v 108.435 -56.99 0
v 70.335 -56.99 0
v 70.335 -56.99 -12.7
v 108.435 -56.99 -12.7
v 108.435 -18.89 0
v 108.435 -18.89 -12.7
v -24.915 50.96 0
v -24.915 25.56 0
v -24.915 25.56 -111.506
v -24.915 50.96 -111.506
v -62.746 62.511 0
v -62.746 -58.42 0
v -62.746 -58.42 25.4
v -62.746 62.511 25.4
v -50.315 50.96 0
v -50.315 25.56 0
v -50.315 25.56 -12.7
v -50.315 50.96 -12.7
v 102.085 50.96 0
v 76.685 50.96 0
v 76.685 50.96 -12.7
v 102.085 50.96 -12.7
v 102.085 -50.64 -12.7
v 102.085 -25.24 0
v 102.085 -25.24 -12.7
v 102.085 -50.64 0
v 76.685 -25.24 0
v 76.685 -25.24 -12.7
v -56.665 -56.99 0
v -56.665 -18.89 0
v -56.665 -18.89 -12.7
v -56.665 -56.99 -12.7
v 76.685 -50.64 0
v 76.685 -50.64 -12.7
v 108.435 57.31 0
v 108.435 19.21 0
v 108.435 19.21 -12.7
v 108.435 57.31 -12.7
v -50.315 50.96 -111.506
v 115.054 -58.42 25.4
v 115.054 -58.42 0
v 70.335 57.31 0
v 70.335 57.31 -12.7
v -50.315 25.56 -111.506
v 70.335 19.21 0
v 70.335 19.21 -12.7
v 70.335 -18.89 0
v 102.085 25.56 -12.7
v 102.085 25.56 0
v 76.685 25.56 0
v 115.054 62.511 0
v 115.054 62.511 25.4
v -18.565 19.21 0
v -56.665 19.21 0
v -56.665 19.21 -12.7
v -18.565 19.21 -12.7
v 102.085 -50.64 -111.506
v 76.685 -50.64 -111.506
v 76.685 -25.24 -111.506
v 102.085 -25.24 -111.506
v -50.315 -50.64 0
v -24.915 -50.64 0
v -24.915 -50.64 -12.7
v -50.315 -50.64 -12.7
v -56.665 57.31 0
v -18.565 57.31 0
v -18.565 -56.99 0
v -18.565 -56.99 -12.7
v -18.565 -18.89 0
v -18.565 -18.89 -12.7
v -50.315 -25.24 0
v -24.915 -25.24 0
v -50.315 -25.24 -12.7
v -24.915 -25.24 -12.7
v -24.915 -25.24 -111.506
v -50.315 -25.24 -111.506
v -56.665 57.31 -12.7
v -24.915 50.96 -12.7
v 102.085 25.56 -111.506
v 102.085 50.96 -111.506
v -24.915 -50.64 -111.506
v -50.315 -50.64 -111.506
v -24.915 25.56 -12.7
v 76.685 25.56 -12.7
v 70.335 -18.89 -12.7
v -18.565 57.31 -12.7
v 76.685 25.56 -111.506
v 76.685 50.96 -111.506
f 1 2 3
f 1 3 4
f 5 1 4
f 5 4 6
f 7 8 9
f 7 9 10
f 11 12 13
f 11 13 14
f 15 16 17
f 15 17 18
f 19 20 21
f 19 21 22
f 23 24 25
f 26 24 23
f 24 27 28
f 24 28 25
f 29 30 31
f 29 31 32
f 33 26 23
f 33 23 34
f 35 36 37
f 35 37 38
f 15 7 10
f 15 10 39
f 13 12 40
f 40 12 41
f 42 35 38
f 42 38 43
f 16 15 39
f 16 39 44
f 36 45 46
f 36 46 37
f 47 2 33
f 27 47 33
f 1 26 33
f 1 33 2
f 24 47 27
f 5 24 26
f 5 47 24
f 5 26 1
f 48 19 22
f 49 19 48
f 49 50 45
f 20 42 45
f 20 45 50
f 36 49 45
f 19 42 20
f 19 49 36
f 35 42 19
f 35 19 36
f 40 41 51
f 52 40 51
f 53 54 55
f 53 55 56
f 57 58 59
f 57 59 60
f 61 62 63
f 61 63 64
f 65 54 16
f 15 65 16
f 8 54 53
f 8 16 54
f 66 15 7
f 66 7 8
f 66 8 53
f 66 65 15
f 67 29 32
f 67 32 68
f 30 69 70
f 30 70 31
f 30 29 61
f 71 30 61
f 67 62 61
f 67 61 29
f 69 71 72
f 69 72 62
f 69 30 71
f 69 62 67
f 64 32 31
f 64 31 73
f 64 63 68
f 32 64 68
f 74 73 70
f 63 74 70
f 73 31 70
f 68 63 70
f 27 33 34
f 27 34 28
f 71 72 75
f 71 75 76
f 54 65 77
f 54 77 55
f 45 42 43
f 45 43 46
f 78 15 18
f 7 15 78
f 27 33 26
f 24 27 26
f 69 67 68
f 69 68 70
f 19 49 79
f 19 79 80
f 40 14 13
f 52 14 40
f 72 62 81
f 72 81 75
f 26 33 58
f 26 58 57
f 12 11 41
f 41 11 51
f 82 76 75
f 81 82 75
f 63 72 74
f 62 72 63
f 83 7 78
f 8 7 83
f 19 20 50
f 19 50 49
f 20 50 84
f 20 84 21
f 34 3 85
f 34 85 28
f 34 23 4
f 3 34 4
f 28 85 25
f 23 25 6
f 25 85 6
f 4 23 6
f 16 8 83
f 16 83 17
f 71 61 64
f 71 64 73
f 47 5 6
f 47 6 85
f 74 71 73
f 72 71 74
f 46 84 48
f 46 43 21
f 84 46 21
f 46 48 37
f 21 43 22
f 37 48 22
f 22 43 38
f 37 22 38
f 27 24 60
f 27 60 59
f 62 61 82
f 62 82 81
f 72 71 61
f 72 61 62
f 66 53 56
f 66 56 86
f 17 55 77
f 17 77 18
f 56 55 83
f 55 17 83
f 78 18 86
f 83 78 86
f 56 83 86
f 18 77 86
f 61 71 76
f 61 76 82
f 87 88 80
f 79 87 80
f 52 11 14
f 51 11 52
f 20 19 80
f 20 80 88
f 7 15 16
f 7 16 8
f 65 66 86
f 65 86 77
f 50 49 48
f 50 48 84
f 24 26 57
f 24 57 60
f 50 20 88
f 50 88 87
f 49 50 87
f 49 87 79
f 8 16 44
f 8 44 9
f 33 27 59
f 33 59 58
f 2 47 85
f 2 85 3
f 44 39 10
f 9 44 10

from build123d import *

# Parameters (mm, degrees)
F0_W     = 12.7
F0_H     = 12.7
F1_DEPTH = 111.506
F2_W     = 177.8
F2_H     = 120.9314045732
F3_DEPTH = 25.4
F4_DEPTH = 12.7


with BuildPart() as f1:
    # F0 (on Top) → F1 (new body)
    with BuildSketch(Plane.XY):
        Polygon((76.6849960148, 50.960245767), (76.6849960148, 38.260245767), (89.3849960148, 38.260245767), (89.3849960148, 25.560245767), (102.0849960148, 25.560245767), (102.0849960148, 50.960245767), align=None)
        with Locations((83.0349960148, 31.910245767)):
            Rectangle(F0_W, F0_H)
    extrude(amount=-F1_DEPTH)


with BuildPart() as f1b:
    # F0 (on Top) → F1, piece 2 (new body)
    with BuildSketch(Plane.XY):
        Polygon((-37.6150039852, -37.939754233), (-37.6150039852, -25.239754233), (-50.3150039852, -25.239754233), (-50.3150039852, -50.639754233), (-24.9150039852, -50.639754233), (-24.9150039852, -37.939754233), align=None)
        with Locations((-31.2650039852, -31.589754233)):
            Rectangle(F0_W, F0_H)
    extrude(amount=-F1_DEPTH)


with BuildPart() as f1c:
    # F0 (on Top) → F1, piece 3 (new body)
    with BuildSketch(Plane.XY):
        Polygon((102.0849960148, -25.239754233), (89.3849960148, -25.239754233), (89.3849960148, -37.939754233), (76.6849960148, -37.939754233), (76.6849960148, -50.639754233), (102.0849960148, -50.639754233), align=None)
        with Locations((83.0349960148, -31.589754233)):
            Rectangle(F0_W, F0_H)
    extrude(amount=-F1_DEPTH)


with BuildPart() as f1d:
    # F0 (on Top) → F1, piece 4 (new body)
    with BuildSketch(Plane.XY):
        with Locations((-31.2650039852, 31.910245767)):
            Rectangle(F0_W, F0_H)
        Polygon((-24.9150039852, 38.260245767), (-24.9150039852, 50.960245767), (-50.3150039852, 50.960245767), (-50.3150039852, 25.560245767), (-37.6150039852, 25.560245767), (-37.6150039852, 38.260245767), align=None)
    extrude(amount=-F1_DEPTH)


with BuildPart() as f3:
    # F2 (on Top) → F3 (new body)
    with BuildSketch(Plane.XY):
        with Locations((26.1539444327, 2.0456369966)):
            Rectangle(F2_W, F2_H)
    extrude(amount=F3_DEPTH)


with BuildPart() as f4:
    # F0 (on Top) → F4 (new body)
    with BuildSketch(Plane.XY):
        Polygon((-37.6150039852, -25.239754233), (-37.6150039852, -18.889754233), (-56.6650039852, -18.889754233), (-56.6650039852, -56.989754233), (-18.5650039852, -56.989754233), (-18.5650039852, -37.939754233), (-24.9150039852, -37.939754233), (-24.9150039852, -50.639754233), (-50.3150039852, -50.639754233), (-50.3150039852, -25.239754233), align=None)
        Polygon((-18.5650039852, -18.889754233), (-37.6150039852, -18.889754233), (-37.6150039852, -25.239754233), (-24.9150039852, -25.239754233), (-24.9150039852, -37.939754233), (-18.5650039852, -37.939754233), align=None)
    extrude(amount=-F4_DEPTH)


with BuildPart() as f4b:
    # F0 (on Top) → F4, piece 2 (new body)
    with BuildSketch(Plane.XY):
        Polygon((108.4349960148, -18.889754233), (89.3849960148, -18.889754233), (89.3849960148, -25.239754233), (102.0849960148, -25.239754233), (102.0849960148, -50.639754233), (76.6849960148, -50.639754233), (76.6849960148, -37.939754233), (70.3349960148, -37.939754233), (70.3349960148, -56.989754233), (108.4349960148, -56.989754233), align=None)
        Polygon((89.3849960148, -25.239754233), (89.3849960148, -18.889754233), (70.3349960148, -18.889754233), (70.3349960148, -37.939754233), (76.6849960148, -37.939754233), (76.6849960148, -25.239754233), align=None)
    extrude(amount=-F4_DEPTH)


with BuildPart() as f4c:
    # F0 (on Top) → F4, piece 3 (new body)
    with BuildSketch(Plane.XY):
        Polygon((76.6849960148, 38.260245767), (70.3349960148, 38.260245767), (70.3349960148, 19.210245767), (89.3849960148, 19.210245767), (89.3849960148, 25.560245767), (76.6849960148, 25.560245767), align=None)
        Polygon((70.3349960148, 57.310245767), (70.3349960148, 38.260245767), (76.6849960148, 38.260245767), (76.6849960148, 50.960245767), (102.0849960148, 50.960245767), (102.0849960148, 25.560245767), (89.3849960148, 25.560245767), (89.3849960148, 19.210245767), (108.4349960148, 19.210245767), (108.4349960148, 57.310245767), align=None)
    extrude(amount=-F4_DEPTH)


with BuildPart() as f4d:
    # F0 (on Top) → F4, piece 4 (new body)
    with BuildSketch(Plane.XY):
        Polygon((-18.5650039852, 38.260245767), (-24.9150039852, 38.260245767), (-24.9150039852, 25.560245767), (-37.6150039852, 25.560245767), (-37.6150039852, 19.210245767), (-18.5650039852, 19.210245767), align=None)
        Polygon((-50.3150039852, 50.960245767), (-24.9150039852, 50.960245767), (-24.9150039852, 38.260245767), (-18.5650039852, 38.260245767), (-18.5650039852, 57.310245767), (-56.6650039852, 57.310245767), (-56.6650039852, 19.210245767), (-37.6150039852, 19.210245767), (-37.6150039852, 25.560245767), (-50.3150039852, 25.560245767), align=None)
    extrude(amount=-F4_DEPTH)


solid = Compound([f1.part, f1b.part, f1c.part, f1d.part, f3.part, f4.part, f4b.part, f4c.part, f4d.part])
